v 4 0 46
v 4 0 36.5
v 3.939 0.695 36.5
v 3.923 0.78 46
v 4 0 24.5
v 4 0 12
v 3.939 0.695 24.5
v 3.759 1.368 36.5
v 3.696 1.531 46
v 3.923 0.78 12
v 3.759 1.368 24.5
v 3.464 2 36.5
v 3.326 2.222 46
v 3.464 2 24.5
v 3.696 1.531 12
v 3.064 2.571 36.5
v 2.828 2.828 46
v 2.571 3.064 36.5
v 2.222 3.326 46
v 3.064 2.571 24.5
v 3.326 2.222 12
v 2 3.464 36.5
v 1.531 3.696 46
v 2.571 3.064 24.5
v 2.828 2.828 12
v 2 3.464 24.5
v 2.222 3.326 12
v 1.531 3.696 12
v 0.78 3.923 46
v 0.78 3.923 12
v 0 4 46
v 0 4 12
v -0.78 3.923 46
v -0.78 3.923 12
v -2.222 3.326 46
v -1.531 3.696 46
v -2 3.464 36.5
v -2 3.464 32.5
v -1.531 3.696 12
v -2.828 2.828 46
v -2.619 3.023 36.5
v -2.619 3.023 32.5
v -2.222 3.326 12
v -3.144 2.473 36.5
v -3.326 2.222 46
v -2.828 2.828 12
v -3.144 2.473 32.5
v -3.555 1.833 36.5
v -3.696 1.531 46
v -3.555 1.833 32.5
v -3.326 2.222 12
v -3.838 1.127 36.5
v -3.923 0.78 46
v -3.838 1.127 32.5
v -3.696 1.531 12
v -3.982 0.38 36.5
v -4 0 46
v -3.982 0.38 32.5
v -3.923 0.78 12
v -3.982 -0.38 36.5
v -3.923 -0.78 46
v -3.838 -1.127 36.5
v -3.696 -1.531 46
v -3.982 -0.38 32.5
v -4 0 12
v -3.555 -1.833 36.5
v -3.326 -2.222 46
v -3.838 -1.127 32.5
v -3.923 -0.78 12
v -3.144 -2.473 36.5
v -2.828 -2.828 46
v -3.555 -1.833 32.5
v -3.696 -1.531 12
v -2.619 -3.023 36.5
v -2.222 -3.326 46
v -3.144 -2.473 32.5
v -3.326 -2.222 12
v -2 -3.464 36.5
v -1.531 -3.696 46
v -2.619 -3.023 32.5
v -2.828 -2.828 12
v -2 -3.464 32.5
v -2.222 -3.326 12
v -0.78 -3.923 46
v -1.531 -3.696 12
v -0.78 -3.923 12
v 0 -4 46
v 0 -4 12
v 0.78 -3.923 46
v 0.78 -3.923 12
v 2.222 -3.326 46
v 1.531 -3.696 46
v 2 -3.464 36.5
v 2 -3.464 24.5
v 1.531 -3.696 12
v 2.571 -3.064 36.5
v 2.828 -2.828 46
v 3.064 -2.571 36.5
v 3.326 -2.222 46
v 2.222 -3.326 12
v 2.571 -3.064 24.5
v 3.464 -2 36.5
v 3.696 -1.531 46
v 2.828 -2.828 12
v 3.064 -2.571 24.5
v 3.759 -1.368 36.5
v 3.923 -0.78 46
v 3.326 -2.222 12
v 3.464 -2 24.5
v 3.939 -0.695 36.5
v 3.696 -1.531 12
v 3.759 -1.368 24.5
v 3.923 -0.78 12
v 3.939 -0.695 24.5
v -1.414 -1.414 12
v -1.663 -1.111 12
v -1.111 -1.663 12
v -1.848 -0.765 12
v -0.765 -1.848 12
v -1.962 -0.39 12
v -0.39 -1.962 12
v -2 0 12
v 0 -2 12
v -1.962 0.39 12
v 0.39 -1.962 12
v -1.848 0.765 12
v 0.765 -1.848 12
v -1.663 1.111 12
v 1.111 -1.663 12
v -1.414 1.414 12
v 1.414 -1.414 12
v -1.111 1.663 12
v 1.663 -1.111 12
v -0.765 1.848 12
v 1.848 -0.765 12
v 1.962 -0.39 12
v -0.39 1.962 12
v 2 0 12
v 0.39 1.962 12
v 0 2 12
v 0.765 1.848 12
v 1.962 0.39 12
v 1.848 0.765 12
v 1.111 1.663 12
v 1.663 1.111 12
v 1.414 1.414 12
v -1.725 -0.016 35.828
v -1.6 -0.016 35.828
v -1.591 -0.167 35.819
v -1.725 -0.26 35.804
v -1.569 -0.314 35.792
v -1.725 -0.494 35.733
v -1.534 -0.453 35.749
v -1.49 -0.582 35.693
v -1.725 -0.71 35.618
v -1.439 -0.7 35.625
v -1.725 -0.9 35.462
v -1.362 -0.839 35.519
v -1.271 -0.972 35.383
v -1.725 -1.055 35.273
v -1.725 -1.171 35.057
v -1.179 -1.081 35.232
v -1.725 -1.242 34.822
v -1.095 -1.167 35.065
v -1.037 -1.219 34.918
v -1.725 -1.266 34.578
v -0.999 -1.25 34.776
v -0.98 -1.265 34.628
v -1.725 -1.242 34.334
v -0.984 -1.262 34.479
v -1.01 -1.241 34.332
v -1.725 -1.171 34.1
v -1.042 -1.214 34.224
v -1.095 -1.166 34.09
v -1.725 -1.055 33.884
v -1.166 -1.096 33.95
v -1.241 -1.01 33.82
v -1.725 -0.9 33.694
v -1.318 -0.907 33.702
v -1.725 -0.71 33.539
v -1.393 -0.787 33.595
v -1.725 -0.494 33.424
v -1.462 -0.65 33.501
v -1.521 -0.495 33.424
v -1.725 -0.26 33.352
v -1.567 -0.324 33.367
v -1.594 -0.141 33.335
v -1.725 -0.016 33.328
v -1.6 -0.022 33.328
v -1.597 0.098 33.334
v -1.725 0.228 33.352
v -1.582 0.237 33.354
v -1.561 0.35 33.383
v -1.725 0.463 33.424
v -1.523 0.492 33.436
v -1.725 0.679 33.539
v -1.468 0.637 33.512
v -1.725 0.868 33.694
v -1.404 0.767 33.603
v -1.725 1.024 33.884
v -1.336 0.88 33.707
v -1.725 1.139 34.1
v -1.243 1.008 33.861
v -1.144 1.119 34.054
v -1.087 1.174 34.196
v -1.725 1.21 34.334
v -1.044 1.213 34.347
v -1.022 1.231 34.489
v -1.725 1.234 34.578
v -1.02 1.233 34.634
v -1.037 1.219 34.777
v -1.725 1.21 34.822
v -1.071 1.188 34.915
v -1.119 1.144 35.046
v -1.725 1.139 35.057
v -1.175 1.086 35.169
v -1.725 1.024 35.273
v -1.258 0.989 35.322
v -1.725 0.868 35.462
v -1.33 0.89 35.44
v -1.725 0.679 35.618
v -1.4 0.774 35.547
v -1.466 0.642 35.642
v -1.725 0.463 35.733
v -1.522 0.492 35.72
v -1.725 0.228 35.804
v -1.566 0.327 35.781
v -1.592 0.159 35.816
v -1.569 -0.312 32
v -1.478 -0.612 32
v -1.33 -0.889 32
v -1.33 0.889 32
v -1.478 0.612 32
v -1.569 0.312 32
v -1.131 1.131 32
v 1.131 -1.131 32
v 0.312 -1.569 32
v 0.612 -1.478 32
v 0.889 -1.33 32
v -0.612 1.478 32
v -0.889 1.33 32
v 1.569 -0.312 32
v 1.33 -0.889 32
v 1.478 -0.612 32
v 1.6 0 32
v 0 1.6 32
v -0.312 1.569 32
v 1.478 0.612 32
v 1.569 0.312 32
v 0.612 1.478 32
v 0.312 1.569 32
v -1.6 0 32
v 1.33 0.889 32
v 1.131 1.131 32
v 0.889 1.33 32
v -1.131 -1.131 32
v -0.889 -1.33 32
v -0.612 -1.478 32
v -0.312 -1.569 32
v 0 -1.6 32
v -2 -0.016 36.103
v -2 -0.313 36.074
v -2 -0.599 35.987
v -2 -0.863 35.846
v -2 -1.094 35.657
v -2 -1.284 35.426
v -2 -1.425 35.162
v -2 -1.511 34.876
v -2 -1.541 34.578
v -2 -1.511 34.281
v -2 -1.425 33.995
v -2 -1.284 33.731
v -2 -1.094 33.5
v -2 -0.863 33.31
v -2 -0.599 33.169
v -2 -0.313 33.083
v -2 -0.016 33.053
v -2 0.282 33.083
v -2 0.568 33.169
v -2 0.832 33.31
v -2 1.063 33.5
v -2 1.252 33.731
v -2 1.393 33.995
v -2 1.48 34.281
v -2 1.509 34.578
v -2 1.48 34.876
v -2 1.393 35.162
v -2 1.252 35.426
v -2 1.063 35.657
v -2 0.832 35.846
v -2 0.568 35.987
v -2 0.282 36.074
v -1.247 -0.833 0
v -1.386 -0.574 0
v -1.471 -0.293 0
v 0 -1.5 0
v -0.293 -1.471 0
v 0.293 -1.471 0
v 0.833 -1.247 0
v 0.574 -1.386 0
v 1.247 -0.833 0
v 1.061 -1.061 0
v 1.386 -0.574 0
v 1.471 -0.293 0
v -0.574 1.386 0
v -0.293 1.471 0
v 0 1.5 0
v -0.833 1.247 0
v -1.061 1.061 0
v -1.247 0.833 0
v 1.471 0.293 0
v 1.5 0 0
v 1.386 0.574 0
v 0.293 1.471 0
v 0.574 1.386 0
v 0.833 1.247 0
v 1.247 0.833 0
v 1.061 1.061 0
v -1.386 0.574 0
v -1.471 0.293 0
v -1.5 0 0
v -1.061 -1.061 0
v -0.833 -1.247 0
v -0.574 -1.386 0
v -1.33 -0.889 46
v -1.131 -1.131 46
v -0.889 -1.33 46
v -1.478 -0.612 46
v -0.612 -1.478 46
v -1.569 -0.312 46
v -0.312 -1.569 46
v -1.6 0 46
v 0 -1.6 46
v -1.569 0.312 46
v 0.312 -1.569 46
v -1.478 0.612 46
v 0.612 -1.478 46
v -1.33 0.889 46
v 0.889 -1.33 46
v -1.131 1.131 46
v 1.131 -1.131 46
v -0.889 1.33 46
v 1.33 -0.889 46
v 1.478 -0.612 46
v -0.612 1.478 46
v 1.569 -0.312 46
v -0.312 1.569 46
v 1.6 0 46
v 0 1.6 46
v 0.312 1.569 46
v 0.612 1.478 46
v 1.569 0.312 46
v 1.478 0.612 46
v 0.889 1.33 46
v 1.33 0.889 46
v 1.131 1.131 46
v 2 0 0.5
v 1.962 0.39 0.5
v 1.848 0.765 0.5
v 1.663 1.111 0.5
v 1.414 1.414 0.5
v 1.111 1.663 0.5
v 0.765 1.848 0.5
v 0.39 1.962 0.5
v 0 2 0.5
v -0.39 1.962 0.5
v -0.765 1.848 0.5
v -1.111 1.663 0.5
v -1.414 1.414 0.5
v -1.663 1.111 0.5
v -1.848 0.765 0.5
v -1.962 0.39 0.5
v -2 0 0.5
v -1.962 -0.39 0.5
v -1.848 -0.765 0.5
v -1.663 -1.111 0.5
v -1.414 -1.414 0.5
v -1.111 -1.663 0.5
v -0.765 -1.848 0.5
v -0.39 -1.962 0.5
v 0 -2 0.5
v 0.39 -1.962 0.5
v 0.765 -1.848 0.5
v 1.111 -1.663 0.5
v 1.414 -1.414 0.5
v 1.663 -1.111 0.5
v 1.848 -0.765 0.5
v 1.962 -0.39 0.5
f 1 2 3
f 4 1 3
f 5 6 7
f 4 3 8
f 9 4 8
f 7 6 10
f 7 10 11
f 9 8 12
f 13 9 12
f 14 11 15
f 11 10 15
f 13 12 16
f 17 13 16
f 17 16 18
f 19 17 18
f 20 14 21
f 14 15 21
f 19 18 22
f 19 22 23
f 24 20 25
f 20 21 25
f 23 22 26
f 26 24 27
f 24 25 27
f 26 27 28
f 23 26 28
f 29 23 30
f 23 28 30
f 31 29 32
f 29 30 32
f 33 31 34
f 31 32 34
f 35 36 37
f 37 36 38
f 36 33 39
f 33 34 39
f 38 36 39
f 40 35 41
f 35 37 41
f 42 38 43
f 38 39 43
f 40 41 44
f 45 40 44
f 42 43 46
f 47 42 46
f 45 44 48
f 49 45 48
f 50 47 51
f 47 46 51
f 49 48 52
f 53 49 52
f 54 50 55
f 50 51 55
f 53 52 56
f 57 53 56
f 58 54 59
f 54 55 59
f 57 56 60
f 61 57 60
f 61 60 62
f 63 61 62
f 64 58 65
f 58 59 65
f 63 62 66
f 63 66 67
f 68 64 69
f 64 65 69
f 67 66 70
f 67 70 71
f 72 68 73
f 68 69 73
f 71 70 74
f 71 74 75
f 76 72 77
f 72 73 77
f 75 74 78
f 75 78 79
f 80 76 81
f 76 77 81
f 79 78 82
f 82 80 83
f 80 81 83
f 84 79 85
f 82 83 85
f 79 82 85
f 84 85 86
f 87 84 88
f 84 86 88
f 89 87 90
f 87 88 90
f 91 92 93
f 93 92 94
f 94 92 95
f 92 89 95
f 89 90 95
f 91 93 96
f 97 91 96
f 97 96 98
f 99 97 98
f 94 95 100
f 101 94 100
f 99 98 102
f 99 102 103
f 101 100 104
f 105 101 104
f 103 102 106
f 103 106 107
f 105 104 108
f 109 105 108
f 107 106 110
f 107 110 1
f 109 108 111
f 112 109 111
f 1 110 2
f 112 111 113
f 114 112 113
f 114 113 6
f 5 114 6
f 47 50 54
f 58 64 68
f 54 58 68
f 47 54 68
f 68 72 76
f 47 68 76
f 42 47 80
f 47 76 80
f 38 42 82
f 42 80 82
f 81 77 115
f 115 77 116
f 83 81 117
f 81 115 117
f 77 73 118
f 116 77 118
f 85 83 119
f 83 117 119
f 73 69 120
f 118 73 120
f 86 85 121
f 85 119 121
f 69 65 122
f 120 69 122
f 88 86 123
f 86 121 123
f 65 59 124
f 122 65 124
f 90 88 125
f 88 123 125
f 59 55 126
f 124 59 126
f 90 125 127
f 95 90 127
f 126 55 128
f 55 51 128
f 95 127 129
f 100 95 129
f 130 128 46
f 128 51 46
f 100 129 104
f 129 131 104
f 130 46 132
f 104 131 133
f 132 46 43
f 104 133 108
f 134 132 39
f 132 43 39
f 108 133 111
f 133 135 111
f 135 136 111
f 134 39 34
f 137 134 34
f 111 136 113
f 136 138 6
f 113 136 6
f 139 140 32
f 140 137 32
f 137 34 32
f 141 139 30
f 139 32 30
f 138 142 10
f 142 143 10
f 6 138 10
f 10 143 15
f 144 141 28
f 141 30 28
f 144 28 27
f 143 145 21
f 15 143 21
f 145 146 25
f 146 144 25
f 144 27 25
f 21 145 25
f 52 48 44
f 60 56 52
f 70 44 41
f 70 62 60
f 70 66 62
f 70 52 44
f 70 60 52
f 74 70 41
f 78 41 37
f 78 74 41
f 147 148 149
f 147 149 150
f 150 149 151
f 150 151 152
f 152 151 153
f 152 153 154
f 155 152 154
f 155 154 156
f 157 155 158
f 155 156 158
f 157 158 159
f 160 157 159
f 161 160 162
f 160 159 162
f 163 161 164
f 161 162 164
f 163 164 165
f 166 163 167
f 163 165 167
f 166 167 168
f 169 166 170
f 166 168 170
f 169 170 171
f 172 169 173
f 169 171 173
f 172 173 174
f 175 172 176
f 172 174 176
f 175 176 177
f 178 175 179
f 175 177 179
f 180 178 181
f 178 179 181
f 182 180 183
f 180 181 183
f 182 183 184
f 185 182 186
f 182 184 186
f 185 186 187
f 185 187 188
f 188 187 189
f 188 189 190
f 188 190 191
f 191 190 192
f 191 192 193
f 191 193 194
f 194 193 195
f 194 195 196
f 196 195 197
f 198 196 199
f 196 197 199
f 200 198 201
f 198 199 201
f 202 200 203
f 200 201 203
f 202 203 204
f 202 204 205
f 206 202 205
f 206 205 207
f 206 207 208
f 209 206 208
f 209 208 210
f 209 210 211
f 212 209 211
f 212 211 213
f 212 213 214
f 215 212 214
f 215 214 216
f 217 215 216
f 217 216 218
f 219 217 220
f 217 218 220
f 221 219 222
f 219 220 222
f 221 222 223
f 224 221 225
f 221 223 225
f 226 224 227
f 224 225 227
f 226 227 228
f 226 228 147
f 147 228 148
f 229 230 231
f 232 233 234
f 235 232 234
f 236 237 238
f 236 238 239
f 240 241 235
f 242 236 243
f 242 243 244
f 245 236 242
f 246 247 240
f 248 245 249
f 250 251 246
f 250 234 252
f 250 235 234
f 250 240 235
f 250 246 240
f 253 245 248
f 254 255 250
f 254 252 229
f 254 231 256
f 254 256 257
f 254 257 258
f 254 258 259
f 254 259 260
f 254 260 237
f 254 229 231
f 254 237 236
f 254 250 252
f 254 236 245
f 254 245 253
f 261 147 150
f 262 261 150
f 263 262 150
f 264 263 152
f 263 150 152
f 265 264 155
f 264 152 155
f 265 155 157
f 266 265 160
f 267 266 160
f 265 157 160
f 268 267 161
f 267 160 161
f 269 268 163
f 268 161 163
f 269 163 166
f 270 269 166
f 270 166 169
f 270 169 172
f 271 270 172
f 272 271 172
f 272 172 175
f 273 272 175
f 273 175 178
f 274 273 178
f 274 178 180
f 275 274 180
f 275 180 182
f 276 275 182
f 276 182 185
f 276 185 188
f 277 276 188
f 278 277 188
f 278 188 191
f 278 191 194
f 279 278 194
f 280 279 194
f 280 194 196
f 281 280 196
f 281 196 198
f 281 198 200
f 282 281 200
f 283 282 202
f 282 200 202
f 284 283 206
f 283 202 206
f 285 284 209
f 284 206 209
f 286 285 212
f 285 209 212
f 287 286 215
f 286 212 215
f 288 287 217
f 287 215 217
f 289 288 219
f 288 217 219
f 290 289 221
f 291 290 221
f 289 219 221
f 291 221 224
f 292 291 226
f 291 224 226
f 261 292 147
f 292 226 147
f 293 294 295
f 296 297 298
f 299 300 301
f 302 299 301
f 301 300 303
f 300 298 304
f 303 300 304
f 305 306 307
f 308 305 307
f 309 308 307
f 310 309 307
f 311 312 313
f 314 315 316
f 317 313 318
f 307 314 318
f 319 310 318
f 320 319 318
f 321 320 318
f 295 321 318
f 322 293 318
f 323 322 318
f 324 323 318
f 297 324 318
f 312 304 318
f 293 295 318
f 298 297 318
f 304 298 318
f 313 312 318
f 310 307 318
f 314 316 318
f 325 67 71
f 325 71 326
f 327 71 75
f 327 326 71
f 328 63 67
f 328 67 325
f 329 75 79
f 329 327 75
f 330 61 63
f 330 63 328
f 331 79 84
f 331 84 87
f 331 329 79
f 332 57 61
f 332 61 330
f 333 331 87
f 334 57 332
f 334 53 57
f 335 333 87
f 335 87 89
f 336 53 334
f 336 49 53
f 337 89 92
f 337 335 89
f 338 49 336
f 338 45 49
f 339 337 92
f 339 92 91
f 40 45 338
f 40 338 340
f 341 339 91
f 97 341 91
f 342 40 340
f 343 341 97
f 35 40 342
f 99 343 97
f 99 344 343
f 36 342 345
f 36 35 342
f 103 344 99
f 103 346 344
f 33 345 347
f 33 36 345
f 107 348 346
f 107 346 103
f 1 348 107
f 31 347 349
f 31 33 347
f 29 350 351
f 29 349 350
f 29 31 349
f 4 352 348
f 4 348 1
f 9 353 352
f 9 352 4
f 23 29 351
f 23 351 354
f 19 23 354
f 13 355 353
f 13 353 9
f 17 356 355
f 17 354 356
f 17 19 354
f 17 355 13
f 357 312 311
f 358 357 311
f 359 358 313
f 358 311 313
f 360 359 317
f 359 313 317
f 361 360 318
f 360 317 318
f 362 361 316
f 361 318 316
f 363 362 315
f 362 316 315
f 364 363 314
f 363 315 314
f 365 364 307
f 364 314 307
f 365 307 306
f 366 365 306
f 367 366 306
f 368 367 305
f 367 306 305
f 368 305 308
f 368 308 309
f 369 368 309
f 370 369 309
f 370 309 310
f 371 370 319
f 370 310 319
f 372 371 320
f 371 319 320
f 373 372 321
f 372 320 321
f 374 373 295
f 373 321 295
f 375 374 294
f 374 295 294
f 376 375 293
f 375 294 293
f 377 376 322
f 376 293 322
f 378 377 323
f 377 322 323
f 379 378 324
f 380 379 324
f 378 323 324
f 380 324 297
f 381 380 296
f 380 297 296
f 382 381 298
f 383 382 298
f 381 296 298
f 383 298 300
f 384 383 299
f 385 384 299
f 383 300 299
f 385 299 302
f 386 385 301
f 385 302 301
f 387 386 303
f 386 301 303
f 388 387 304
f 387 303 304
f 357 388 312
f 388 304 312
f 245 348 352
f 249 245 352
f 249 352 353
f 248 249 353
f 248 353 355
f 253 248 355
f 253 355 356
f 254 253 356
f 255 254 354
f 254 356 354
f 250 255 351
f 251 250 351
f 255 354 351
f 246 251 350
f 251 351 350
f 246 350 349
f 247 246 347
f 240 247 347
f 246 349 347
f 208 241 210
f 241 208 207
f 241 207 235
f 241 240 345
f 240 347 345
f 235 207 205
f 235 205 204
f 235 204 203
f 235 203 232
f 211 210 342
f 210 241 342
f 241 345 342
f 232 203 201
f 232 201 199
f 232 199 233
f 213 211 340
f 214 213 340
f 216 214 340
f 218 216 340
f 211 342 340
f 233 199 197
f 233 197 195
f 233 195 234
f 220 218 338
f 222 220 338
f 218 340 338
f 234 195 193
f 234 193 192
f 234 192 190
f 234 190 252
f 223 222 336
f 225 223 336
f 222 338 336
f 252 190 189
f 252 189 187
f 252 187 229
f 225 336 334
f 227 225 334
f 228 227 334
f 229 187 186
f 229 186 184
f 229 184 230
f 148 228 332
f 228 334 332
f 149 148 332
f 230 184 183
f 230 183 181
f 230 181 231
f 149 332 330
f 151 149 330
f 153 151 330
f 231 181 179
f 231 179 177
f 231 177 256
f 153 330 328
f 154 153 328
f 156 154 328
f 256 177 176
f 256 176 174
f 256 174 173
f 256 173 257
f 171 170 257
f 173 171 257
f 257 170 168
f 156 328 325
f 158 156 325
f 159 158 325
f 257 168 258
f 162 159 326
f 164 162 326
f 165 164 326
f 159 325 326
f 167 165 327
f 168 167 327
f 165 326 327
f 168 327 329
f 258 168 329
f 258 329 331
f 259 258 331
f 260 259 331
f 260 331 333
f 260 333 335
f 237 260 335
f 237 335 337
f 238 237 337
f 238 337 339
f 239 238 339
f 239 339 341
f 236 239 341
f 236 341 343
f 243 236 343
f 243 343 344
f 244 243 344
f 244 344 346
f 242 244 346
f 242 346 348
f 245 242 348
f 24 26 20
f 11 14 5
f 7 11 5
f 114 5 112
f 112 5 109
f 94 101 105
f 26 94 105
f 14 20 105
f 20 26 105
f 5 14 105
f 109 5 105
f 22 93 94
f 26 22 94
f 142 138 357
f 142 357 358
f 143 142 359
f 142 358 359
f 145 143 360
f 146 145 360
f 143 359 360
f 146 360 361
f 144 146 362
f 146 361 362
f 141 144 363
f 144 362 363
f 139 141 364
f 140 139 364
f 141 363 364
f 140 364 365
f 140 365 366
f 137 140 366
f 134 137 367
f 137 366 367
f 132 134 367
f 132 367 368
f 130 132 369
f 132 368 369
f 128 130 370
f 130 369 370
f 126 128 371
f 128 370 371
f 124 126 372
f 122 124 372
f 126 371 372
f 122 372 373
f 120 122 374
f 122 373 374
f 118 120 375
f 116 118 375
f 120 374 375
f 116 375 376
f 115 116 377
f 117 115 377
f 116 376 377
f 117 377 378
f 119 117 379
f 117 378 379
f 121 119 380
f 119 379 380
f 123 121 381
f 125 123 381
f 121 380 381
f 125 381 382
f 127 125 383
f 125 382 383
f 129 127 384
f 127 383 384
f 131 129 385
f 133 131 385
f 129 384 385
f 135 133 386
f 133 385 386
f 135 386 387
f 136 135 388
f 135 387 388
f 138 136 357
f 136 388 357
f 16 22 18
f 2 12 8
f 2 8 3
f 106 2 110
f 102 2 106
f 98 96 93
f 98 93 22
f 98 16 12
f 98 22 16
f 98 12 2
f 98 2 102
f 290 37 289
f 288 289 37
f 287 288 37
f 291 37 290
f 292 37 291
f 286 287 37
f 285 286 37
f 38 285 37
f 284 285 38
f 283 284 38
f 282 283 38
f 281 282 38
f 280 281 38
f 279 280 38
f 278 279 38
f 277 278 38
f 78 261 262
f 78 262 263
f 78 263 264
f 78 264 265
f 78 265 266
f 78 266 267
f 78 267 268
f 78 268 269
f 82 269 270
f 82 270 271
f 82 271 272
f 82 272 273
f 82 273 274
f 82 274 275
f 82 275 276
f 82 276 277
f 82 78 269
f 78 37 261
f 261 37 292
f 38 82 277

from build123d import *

# Parameters (mm, degrees)
SKETCH1_R                       = 2
BOSS_EXTRUDE1_DEPTH             = 12
CHAMFER1_SIZE                   = 0.5
SKETCH2_R                       = 4
BOSS_EXTRUDE2_DEPTH             = 34
SKETCH3_R                       = 1.6
CUT_EXTRUDE1_DEPTH              = 14
CUT_EXTRUDE2_DEPTH              = 47.346520905
CUT_EXTRUDE2_DEPTH_BACK         = 47.346520905
SKETCH4_W                       = 2
SKETCH4_H                       = 12
M3X0_5_TAPPED_HOLE1_D           = 2.5
M3X0_5_TAPPED_HOLE1_DEPTH       = 13.248924226
M3X0_5_TAPPED_HOLE1_CSINK_D     = 3.05
M3X0_5_TAPPED_HOLE1_CSINK_ANGLE = 90
M3X0_5_TAPPED_HOLE1_TIP         = 0.751075774
CUT_EXTRUDE3_DEPTH              = 47.346520905
CUT_EXTRUDE3_DEPTH_BACK         = 47.346520905
SKETCH7_W                       = 2
SKETCH7_H                       = 4
M3X0_5_TAPPED_HOLE3_D           = 2.5
M3X0_5_TAPPED_HOLE3_DEPTH       = 1.248924226
M3X0_5_TAPPED_HOLE3_CSINK_D     = 3.05
M3X0_5_TAPPED_HOLE3_CSINK_ANGLE = 90
M3X0_5_TAPPED_HOLE3_TIP         = 0.751075774


with BuildPart() as part:
    # Sketch1 → Boss-Extrude1 (new body)
    with BuildSketch(Plane.XY):
        Circle(SKETCH1_R)
    extrude(amount=BOSS_EXTRUDE1_DEPTH)

    # Chamfer1
    chamfer1_edges = [part.edges().sort_by_distance(p)[0] for p in [
        (-2, 0, 0),
    ]]
    chamfer(chamfer1_edges, length=CHAMFER1_SIZE)

    # Sketch2 → Boss-Extrude2 (add)
    with BuildSketch(Plane.XY.offset(12)):
        Circle(SKETCH2_R)
    extrude(amount=BOSS_EXTRUDE2_DEPTH)

    # Sketch3 → Cut-Extrude1 (cut)
    with BuildSketch(Plane.XY.offset(46)):
        Circle(SKETCH3_R)
    extrude(amount=-CUT_EXTRUDE1_DEPTH, mode=Mode.SUBTRACT)

    # Sketch4 → Cut-Extrude2 (cut, two sides: drawn at the far end of the back side and taken through both)
    with BuildSketch(Plane(origin=(0, 0, 0), x_dir=(1, 0, 0), z_dir=(0, 1, 0)).offset(-CUT_EXTRUDE2_DEPTH_BACK)):
        with Locations((3, -30.5)):
            Rectangle(SKETCH4_W, SKETCH4_H)
    extrude(amount=CUT_EXTRUDE2_DEPTH + CUT_EXTRUDE2_DEPTH_BACK, mode=Mode.SUBTRACT)

    # M3x0.5 Tapped Hole1
    with Locations(Plane.XY.offset(46)):
        with Locations((0, 0)):
            CounterSinkHole(M3X0_5_TAPPED_HOLE1_D / 2, M3X0_5_TAPPED_HOLE1_CSINK_D / 2, depth=M3X0_5_TAPPED_HOLE1_DEPTH, counter_sink_angle=M3X0_5_TAPPED_HOLE1_CSINK_ANGLE)
            with Locations((0, 0, -(M3X0_5_TAPPED_HOLE1_DEPTH + M3X0_5_TAPPED_HOLE1_TIP / 2))):  # 118° drill point
                Cone(0, M3X0_5_TAPPED_HOLE1_D / 2, M3X0_5_TAPPED_HOLE1_TIP, mode=Mode.SUBTRACT)

    # Sketch7 → Cut-Extrude3 (cut, two sides: drawn at the far end of the back side and taken through both)
    with BuildSketch(Plane(origin=(0, 0, 0), x_dir=(1, 0, 0), z_dir=(0, 1, 0)).offset(-CUT_EXTRUDE3_DEPTH_BACK)):
        with Locations((-3, -34.5)):
            Rectangle(SKETCH7_W, SKETCH7_H)
    extrude(amount=CUT_EXTRUDE3_DEPTH + CUT_EXTRUDE3_DEPTH_BACK, mode=Mode.SUBTRACT)

    # M3x0.5 Tapped Hole3
    with Locations(Plane(origin=(-2, -0.015660655, 34.578358954), x_dir=(0, 0, -1), z_dir=(-1, 0, 0))):
        with Locations((0, 0)):
            CounterSinkHole(M3X0_5_TAPPED_HOLE3_D / 2, M3X0_5_TAPPED_HOLE3_CSINK_D / 2, depth=M3X0_5_TAPPED_HOLE3_DEPTH, counter_sink_angle=M3X0_5_TAPPED_HOLE3_CSINK_ANGLE)
            with Locations((0, 0, -(M3X0_5_TAPPED_HOLE3_DEPTH + M3X0_5_TAPPED_HOLE3_TIP / 2))):  # 118° drill point
                Cone(0, M3X0_5_TAPPED_HOLE3_D / 2, M3X0_5_TAPPED_HOLE3_TIP, mode=Mode.SUBTRACT)


solid = part.part
